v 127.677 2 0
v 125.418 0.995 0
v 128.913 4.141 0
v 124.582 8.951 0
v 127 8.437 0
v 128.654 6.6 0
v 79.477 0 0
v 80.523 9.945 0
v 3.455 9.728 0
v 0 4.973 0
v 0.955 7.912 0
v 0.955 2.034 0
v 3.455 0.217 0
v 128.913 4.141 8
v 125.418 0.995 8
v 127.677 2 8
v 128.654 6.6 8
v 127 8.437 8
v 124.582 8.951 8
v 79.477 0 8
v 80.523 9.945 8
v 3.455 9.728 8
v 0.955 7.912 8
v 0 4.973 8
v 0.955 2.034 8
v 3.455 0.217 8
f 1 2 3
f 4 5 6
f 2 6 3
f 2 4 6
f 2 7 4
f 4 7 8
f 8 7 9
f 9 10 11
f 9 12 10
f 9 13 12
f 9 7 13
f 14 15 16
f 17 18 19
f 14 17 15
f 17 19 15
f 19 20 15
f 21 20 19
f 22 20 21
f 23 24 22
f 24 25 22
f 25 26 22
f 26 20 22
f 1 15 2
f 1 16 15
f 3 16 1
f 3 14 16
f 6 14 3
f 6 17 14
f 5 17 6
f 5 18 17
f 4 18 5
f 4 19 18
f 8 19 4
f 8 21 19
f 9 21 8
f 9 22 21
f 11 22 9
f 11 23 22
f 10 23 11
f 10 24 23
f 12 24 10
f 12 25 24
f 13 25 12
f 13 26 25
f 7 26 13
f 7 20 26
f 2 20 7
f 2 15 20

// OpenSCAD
$fn = 32;

// ----------------------------------------------------------------------
// Lever arm: two bosses 10 and 10 mm, 75 mm between centres
// ----------------------------------------------------------------------

// --- parameters (mm) ---
profile_height = 8;       // extrusion height
profile_points = 13;      // points of the closed outline

profile = [[0, 4.973], [0.955, 2.034], [3.455, 0.217], [79.477, 0], [125.418, 0.995], [127.677, 2], [128.913, 4.141], [128.654, 6.6], [127, 8.437], [124.582, 8.951], [80.523, 9.945], [3.455, 9.728], [0.955, 7.912]];  // single closed polygon, 13 points, counter clockwise

// --- the one profile operation ---
linear_extrude(height = profile_height) polygon(points = profile);
